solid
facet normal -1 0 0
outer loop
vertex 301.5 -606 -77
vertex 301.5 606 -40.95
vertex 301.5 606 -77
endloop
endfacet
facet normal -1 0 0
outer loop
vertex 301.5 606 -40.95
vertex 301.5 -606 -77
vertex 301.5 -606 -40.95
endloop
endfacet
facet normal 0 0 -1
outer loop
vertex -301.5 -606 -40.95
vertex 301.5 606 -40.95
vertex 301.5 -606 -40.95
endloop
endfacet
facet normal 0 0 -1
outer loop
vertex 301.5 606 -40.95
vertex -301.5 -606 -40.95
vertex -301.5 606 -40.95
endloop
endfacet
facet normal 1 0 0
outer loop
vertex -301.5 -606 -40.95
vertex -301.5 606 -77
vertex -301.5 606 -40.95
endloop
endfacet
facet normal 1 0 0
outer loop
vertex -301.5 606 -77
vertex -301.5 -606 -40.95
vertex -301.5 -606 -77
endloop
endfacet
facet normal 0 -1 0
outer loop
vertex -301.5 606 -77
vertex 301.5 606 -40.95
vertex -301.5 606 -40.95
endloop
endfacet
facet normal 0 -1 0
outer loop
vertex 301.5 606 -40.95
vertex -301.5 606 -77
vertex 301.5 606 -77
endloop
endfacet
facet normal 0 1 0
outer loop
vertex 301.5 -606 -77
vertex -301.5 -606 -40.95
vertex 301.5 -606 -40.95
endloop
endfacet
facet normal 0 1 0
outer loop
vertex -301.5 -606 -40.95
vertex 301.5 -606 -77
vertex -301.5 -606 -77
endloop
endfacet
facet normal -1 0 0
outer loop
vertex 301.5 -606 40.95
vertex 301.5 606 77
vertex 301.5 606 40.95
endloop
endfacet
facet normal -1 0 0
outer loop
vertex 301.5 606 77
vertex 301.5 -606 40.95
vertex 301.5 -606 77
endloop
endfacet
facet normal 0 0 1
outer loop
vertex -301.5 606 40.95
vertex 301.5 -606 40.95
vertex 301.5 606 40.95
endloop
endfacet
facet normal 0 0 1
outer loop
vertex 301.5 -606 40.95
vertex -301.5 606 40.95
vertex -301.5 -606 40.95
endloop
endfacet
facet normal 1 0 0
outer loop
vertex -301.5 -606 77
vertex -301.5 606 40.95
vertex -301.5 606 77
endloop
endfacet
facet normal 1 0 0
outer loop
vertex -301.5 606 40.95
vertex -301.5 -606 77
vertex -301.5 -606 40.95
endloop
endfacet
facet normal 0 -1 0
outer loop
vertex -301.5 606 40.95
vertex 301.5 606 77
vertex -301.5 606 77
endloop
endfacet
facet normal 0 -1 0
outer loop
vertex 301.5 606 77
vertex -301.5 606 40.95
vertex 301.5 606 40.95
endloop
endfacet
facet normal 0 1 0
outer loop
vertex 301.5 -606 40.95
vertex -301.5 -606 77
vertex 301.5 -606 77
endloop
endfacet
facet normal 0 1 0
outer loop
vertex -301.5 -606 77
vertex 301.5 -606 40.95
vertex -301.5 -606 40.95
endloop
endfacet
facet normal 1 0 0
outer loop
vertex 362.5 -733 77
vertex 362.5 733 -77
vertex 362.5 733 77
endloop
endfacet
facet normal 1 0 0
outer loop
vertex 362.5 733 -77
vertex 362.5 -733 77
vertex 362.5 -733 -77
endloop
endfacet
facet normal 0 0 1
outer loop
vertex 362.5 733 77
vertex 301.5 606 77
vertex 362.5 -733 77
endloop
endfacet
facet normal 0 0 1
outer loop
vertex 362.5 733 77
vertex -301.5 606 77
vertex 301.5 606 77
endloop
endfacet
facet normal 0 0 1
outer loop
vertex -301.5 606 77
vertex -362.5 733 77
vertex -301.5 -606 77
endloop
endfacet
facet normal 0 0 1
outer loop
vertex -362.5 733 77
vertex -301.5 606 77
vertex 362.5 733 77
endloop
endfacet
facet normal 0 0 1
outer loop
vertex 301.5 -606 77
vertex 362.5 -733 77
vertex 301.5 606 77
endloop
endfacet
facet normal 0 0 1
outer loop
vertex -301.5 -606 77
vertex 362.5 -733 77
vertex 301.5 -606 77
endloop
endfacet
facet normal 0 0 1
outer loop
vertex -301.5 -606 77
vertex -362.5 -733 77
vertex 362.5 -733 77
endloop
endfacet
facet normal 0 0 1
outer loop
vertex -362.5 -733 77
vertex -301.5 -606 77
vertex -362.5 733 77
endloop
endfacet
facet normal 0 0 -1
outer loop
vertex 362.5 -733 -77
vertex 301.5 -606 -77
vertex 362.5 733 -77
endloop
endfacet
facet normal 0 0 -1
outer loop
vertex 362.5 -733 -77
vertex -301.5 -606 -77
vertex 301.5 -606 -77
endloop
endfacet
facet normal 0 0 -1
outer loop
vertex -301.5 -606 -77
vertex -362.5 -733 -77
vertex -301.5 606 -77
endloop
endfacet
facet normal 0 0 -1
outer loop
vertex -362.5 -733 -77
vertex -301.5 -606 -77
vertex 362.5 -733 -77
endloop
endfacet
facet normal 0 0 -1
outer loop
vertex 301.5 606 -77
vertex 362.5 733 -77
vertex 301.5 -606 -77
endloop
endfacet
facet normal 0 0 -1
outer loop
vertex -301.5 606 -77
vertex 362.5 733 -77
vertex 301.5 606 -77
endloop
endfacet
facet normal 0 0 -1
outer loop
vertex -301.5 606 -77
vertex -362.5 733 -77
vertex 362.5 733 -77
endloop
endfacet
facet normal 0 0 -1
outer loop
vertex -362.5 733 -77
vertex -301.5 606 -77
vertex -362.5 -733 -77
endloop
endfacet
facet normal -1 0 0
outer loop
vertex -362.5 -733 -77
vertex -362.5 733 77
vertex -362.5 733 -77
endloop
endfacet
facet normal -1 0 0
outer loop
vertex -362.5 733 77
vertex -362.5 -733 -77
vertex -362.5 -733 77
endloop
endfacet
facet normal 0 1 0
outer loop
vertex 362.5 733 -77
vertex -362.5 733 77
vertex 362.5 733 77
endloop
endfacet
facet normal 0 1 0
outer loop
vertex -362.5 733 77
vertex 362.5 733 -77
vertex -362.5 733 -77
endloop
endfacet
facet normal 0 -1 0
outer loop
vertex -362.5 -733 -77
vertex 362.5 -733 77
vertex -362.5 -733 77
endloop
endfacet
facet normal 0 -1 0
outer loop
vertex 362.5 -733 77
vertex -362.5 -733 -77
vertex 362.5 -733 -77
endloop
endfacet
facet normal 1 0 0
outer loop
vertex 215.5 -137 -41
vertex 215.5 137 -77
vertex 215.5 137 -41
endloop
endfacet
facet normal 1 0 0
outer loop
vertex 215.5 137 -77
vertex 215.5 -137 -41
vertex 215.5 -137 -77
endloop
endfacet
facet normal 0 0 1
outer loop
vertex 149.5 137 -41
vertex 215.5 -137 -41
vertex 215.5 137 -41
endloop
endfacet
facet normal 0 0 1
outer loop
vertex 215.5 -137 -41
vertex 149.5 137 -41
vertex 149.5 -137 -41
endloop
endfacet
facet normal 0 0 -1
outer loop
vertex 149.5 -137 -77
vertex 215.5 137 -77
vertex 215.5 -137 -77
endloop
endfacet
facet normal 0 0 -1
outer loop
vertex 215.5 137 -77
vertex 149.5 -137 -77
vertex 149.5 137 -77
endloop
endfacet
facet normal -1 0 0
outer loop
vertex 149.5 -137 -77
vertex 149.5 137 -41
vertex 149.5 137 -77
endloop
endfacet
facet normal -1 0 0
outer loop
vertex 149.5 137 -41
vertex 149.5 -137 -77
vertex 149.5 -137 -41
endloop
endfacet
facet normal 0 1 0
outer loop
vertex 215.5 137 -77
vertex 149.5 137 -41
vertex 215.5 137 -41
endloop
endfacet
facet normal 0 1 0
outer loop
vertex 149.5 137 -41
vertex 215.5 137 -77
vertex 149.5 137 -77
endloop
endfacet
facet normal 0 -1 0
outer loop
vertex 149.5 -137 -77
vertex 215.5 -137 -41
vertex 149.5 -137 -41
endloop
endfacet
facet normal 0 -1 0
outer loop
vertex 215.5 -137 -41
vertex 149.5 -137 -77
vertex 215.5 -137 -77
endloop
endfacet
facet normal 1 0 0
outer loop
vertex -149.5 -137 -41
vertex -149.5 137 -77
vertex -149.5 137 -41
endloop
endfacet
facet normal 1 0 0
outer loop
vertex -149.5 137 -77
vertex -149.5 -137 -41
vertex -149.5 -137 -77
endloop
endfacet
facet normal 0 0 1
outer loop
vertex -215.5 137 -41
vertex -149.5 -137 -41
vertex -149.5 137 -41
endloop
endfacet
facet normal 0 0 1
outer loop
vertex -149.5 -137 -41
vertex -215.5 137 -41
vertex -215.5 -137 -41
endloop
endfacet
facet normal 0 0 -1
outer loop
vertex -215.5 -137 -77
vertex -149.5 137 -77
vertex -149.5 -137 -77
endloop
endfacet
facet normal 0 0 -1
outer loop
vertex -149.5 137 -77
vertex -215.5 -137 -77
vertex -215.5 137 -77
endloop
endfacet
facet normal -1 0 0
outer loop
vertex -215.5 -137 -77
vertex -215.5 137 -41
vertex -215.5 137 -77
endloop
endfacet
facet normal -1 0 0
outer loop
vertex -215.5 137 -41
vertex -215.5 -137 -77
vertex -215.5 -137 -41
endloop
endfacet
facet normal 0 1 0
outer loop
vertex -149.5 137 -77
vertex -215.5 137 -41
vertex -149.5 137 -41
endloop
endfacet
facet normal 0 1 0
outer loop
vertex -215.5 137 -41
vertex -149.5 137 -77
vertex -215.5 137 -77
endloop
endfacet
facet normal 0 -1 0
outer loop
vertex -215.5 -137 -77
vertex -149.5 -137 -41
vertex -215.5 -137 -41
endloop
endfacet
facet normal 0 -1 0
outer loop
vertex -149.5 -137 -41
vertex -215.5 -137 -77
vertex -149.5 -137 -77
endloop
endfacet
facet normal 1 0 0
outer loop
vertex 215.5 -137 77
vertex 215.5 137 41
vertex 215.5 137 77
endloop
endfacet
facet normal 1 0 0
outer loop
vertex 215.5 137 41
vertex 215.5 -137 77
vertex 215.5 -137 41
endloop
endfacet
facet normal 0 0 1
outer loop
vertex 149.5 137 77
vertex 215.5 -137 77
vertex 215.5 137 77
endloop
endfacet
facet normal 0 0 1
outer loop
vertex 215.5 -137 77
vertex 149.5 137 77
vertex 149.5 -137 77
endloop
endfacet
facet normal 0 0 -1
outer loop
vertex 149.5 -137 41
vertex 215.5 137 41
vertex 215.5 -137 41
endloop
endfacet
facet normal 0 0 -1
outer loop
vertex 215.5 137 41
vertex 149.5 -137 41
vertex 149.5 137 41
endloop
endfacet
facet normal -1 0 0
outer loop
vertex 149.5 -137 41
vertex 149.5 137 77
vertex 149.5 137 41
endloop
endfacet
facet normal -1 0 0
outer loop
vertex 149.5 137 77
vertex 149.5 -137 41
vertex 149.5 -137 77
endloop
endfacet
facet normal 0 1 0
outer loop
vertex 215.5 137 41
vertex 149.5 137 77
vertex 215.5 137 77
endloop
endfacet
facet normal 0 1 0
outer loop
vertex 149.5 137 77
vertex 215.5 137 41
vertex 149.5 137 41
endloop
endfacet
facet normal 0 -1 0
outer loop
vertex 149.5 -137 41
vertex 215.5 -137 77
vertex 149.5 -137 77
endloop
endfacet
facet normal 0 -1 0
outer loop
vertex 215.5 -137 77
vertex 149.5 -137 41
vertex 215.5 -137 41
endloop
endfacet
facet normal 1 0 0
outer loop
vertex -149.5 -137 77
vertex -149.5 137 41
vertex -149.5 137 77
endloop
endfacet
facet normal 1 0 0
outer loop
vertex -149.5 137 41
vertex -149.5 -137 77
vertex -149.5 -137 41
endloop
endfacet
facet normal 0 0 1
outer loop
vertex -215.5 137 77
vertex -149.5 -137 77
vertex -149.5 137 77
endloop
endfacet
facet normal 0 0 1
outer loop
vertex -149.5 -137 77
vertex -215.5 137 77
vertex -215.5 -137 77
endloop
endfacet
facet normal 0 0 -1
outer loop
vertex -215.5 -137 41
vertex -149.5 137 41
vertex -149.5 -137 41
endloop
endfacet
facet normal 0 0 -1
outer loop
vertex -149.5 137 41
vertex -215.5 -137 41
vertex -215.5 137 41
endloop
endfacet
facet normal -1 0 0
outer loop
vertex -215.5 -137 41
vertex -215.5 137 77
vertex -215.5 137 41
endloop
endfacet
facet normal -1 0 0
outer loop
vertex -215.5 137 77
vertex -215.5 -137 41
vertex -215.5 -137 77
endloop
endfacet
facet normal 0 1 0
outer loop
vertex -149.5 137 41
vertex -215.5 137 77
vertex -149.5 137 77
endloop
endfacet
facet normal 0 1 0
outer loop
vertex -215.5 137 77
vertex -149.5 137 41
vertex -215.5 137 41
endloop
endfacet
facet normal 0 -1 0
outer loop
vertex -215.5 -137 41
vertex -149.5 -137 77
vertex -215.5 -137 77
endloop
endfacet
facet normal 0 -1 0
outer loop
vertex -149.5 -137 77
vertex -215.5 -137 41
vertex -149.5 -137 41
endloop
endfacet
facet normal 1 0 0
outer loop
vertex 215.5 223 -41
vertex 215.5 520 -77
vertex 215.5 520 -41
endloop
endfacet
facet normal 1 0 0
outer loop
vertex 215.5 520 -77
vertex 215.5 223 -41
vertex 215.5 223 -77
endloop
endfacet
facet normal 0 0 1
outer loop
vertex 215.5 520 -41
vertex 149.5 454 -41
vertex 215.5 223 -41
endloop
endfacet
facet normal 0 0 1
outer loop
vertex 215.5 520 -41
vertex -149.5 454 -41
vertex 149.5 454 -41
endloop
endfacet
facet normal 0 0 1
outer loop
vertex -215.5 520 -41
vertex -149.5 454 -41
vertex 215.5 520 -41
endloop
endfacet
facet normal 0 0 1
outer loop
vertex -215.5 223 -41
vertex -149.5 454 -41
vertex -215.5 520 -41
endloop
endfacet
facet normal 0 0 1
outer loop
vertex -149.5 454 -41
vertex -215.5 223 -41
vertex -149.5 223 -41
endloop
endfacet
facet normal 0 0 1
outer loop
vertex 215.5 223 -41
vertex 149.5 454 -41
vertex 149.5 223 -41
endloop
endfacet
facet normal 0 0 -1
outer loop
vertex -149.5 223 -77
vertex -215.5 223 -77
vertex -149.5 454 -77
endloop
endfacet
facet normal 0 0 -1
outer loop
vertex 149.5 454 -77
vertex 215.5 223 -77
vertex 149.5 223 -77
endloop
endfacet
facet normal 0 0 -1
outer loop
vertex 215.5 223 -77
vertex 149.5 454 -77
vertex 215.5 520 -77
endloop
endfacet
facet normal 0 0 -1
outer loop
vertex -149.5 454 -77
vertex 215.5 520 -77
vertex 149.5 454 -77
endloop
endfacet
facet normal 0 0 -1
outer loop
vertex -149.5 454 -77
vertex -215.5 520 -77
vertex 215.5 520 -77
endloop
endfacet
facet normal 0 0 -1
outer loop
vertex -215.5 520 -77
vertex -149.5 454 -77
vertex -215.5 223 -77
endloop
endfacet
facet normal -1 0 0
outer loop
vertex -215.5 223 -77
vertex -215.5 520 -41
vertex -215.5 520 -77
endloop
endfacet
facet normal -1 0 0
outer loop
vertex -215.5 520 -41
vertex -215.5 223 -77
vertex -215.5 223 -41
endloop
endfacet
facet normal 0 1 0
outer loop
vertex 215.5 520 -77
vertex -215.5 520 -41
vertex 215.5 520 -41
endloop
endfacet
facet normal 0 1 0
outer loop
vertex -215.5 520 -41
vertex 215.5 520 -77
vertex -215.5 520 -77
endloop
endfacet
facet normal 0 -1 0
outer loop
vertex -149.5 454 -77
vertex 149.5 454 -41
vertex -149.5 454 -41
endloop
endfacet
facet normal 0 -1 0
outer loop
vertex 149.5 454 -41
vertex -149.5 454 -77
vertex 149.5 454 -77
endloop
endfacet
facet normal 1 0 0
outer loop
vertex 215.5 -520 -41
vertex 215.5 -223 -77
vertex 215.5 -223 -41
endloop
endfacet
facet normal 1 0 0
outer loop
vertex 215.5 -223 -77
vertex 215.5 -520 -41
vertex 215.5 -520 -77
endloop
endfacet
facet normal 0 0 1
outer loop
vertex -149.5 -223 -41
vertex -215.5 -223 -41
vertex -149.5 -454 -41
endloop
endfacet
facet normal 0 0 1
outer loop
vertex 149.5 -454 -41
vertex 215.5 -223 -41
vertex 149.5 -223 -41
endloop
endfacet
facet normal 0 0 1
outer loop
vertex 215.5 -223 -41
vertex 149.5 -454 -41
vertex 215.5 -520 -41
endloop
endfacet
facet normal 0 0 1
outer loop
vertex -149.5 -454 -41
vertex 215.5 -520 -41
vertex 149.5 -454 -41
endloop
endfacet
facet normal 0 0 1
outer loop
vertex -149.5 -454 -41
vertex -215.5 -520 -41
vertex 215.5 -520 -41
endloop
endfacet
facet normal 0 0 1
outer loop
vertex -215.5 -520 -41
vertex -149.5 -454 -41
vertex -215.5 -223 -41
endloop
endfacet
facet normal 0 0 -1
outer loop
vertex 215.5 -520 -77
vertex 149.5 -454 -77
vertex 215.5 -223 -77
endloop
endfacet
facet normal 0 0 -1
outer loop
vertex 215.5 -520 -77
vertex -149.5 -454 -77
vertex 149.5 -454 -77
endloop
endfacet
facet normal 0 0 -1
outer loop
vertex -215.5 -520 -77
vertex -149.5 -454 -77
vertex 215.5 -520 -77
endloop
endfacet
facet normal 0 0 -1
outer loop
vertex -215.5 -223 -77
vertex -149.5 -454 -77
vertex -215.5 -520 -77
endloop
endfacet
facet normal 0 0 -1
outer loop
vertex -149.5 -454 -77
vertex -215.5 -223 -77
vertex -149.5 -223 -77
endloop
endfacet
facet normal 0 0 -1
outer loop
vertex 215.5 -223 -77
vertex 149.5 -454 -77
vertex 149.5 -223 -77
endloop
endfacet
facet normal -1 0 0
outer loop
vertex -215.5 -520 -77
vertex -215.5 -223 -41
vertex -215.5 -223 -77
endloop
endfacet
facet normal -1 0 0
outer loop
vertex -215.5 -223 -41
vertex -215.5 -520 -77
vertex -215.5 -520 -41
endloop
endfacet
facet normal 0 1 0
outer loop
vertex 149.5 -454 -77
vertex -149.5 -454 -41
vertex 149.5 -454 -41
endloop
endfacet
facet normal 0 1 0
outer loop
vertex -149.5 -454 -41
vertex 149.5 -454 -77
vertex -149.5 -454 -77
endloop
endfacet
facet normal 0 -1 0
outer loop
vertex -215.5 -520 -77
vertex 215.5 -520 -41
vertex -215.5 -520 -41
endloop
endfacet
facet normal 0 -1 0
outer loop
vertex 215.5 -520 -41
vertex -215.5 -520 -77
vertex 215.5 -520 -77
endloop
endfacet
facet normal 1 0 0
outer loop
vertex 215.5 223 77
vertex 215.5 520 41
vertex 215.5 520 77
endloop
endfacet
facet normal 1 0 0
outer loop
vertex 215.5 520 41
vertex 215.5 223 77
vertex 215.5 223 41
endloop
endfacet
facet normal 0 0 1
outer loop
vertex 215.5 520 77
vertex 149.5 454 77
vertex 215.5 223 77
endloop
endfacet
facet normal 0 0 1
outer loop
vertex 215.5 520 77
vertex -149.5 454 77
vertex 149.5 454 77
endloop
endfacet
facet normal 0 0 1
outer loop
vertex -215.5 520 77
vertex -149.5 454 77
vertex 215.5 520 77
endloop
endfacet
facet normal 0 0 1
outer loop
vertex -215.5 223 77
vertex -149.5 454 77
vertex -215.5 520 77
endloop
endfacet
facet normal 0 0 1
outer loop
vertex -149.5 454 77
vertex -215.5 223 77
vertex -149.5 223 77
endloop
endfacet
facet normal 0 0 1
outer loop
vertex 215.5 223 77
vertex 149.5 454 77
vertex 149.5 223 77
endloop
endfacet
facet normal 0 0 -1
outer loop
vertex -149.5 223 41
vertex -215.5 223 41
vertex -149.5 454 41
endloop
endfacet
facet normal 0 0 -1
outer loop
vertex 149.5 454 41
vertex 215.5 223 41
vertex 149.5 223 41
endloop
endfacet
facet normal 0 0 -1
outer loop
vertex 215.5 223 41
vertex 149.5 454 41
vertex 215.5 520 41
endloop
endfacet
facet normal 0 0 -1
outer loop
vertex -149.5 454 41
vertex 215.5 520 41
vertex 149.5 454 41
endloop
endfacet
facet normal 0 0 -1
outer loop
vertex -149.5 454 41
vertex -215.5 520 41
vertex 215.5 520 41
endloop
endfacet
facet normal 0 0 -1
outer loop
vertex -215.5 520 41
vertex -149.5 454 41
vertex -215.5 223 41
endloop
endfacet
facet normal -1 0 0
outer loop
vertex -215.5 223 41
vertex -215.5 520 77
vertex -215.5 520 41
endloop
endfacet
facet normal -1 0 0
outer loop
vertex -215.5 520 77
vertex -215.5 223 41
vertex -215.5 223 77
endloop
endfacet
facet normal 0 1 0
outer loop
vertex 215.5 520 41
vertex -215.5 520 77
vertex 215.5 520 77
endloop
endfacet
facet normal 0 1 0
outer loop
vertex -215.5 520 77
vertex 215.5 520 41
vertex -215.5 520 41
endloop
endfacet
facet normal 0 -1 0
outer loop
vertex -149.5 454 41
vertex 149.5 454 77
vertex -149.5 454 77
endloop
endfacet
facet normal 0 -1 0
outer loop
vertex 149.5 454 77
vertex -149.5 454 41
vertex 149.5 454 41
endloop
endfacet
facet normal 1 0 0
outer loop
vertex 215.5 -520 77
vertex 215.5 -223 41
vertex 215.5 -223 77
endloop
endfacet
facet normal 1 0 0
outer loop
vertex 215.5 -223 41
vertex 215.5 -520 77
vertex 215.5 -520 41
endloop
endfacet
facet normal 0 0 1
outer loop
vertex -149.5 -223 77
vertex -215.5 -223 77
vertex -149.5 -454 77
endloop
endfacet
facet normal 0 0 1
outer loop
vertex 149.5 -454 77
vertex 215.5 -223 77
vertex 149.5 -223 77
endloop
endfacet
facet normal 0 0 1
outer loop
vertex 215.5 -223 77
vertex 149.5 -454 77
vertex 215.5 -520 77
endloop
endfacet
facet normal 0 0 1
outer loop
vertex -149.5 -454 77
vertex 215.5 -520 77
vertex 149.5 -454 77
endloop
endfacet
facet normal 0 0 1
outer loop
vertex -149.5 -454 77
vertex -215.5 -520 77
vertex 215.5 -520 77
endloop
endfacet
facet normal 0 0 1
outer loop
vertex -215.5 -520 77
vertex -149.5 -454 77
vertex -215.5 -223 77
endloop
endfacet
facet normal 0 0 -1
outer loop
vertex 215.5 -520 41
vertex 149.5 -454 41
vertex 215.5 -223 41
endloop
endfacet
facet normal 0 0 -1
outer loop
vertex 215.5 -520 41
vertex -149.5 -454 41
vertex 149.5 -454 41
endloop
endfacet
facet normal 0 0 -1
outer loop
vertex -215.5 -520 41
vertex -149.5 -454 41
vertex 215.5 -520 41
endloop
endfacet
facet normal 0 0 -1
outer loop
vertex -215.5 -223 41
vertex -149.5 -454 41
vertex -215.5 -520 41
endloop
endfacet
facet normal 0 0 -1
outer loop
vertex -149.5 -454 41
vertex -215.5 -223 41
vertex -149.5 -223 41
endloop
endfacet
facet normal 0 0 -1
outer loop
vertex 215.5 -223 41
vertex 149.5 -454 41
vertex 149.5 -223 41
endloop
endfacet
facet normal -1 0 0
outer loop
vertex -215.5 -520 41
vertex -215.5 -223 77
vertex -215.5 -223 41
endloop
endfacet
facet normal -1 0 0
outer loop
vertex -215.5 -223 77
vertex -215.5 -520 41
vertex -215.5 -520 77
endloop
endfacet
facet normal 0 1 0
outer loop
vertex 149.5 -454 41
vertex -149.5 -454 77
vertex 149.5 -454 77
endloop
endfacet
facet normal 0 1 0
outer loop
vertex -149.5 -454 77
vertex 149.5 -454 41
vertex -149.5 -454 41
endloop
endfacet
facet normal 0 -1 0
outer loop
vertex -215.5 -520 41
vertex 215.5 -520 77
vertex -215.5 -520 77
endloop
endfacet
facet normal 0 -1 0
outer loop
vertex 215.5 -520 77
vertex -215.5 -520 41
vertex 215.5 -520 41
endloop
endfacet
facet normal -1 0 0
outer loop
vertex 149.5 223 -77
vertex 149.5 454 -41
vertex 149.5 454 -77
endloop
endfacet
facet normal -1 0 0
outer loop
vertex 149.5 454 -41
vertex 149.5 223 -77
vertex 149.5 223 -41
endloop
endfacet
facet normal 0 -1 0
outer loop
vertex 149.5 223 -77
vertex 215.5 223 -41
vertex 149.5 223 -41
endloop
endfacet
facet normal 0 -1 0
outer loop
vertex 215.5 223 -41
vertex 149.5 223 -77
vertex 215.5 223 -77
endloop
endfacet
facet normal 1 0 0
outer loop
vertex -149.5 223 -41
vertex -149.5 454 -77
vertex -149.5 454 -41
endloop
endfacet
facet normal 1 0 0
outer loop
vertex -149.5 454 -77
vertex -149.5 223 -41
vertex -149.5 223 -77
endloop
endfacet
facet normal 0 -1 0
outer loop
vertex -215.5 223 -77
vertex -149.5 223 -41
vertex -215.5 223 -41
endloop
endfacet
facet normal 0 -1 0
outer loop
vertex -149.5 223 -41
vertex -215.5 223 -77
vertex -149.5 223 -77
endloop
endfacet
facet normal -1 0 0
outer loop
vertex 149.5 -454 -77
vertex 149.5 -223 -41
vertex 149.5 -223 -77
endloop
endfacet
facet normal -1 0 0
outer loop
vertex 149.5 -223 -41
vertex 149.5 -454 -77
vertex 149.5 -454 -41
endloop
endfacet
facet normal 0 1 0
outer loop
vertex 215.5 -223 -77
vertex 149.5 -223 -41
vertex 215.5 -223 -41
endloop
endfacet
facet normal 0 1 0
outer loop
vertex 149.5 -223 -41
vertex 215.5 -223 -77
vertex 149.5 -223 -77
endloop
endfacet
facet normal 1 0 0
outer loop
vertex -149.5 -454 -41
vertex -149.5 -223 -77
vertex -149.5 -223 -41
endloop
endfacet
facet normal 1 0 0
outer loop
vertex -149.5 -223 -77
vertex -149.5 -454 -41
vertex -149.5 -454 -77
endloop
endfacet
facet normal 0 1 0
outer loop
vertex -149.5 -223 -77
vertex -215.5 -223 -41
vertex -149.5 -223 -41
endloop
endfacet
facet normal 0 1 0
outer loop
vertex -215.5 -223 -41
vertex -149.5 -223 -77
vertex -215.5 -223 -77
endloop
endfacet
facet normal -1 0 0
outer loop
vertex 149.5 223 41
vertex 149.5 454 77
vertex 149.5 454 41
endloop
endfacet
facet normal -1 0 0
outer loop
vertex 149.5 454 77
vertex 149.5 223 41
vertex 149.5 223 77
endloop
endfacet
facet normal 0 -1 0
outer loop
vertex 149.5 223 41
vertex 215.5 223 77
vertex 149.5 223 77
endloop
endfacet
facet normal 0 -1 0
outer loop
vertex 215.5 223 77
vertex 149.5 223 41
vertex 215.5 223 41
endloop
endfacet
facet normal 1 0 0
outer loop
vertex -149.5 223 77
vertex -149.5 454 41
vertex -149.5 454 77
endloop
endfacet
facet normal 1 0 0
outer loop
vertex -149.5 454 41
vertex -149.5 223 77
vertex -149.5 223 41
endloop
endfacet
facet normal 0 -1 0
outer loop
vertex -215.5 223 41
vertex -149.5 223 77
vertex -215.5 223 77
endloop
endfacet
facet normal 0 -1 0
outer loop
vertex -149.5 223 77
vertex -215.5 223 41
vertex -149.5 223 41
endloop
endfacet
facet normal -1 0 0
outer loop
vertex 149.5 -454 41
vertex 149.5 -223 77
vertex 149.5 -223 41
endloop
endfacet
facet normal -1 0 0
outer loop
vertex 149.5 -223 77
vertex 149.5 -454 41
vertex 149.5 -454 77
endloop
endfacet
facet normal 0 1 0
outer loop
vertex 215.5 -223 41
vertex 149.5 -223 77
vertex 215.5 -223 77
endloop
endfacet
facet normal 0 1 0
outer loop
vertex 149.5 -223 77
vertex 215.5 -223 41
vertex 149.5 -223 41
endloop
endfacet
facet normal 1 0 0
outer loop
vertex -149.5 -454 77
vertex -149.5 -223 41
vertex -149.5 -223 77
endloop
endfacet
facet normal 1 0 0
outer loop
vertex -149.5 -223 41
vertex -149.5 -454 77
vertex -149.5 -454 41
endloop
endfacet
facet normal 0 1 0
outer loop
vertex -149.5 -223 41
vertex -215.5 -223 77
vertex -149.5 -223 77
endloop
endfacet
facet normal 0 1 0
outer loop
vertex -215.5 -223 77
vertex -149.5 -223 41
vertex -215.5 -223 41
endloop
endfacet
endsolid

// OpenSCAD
// Box dimensions
box_width = 725;
box_depth = 1466;
box_height = 154;

// Recess parameters
recess_depth = 36;
bezel_width_x = 61;
bezel_width_y = 127;

// Calculated recess dimensions
recess_width = box_width - (2 * bezel_width_x);
recess_depth_y = box_depth - (2 * bezel_width_y);

// Protruding box parameters
protrude_width = 66;
protrude_depth = 274;
protrude_height = 36;
protrude_x_offset = (recess_width/2) - 86 - (protrude_width/2); // 86 units from end of recess

// Second protruding box parameters (maximum width with 86 clearance)
protrude2_width = recess_width - (2 * 86); // Maximum width leaving 86 on each side
protrude2_depth = 66;
protrude2_height = 36;
protrude2_y_offset = (recess_depth_y/2) - 86 - (protrude2_depth/2); // 86 units from end of recess

// Connecting boxes parameters (to create C shape)
connect_width = 66;
connect_depth = protrude2_y_offset - (protrude_depth/2 + 86); // Extend toward corner boxes with 86 clearance
connect_height = 36;
connect_y_offset = protrude2_y_offset - (connect_depth/2); // Position between horizontal and corner boxes

union() {
    difference() {
        // Main box
        cube([box_width, box_depth, box_height], center=true);
        
        // Recess cutouts on top and bottom using a loop
        for (z_pos = [-(box_height - recess_depth) / 2, (box_height - recess_depth) / 2]) {
            translate([0, 0, z_pos]) {
                cube([recess_width, recess_depth_y, recess_depth + 0.1], center=true);
            }
        }
    }
    
    // Protruding boxes on both sides of top and bottom recess areas
    for (z_pos = [-(box_height - recess_depth) / 2, (box_height - recess_depth) / 2]) {
        for (x_pos = [protrude_x_offset, -protrude_x_offset]) {
            translate([x_pos, 0, z_pos]) {
                cube([protrude_width, protrude_depth, protrude_height], center=true);
            }
        }
    }
    
    // Second protruding box on both sides of top and bottom recess areas
    for (z_pos = [-(box_height - recess_depth) / 2, (box_height - recess_depth) / 2]) {
        for (y_pos = [protrude2_y_offset, -protrude2_y_offset]) {
            translate([0, y_pos, z_pos]) {
                cube([protrude2_width, protrude2_depth, protrude2_height], center=true);
            }
        }
    }
    
    // Connecting boxes to create C shape (extending from horizontal boxes toward corner boxes)
    for (z_pos = [-(box_height - recess_depth) / 2, (box_height - recess_depth) / 2]) {
        for (y_pos = [connect_y_offset, -connect_y_offset]) {
            for (x_pos = [protrude_x_offset, -protrude_x_offset]) {
                translate([x_pos, y_pos, z_pos]) {
                    cube([connect_width, connect_depth, connect_height], center=true);
                }
            }
        }
    }
}
